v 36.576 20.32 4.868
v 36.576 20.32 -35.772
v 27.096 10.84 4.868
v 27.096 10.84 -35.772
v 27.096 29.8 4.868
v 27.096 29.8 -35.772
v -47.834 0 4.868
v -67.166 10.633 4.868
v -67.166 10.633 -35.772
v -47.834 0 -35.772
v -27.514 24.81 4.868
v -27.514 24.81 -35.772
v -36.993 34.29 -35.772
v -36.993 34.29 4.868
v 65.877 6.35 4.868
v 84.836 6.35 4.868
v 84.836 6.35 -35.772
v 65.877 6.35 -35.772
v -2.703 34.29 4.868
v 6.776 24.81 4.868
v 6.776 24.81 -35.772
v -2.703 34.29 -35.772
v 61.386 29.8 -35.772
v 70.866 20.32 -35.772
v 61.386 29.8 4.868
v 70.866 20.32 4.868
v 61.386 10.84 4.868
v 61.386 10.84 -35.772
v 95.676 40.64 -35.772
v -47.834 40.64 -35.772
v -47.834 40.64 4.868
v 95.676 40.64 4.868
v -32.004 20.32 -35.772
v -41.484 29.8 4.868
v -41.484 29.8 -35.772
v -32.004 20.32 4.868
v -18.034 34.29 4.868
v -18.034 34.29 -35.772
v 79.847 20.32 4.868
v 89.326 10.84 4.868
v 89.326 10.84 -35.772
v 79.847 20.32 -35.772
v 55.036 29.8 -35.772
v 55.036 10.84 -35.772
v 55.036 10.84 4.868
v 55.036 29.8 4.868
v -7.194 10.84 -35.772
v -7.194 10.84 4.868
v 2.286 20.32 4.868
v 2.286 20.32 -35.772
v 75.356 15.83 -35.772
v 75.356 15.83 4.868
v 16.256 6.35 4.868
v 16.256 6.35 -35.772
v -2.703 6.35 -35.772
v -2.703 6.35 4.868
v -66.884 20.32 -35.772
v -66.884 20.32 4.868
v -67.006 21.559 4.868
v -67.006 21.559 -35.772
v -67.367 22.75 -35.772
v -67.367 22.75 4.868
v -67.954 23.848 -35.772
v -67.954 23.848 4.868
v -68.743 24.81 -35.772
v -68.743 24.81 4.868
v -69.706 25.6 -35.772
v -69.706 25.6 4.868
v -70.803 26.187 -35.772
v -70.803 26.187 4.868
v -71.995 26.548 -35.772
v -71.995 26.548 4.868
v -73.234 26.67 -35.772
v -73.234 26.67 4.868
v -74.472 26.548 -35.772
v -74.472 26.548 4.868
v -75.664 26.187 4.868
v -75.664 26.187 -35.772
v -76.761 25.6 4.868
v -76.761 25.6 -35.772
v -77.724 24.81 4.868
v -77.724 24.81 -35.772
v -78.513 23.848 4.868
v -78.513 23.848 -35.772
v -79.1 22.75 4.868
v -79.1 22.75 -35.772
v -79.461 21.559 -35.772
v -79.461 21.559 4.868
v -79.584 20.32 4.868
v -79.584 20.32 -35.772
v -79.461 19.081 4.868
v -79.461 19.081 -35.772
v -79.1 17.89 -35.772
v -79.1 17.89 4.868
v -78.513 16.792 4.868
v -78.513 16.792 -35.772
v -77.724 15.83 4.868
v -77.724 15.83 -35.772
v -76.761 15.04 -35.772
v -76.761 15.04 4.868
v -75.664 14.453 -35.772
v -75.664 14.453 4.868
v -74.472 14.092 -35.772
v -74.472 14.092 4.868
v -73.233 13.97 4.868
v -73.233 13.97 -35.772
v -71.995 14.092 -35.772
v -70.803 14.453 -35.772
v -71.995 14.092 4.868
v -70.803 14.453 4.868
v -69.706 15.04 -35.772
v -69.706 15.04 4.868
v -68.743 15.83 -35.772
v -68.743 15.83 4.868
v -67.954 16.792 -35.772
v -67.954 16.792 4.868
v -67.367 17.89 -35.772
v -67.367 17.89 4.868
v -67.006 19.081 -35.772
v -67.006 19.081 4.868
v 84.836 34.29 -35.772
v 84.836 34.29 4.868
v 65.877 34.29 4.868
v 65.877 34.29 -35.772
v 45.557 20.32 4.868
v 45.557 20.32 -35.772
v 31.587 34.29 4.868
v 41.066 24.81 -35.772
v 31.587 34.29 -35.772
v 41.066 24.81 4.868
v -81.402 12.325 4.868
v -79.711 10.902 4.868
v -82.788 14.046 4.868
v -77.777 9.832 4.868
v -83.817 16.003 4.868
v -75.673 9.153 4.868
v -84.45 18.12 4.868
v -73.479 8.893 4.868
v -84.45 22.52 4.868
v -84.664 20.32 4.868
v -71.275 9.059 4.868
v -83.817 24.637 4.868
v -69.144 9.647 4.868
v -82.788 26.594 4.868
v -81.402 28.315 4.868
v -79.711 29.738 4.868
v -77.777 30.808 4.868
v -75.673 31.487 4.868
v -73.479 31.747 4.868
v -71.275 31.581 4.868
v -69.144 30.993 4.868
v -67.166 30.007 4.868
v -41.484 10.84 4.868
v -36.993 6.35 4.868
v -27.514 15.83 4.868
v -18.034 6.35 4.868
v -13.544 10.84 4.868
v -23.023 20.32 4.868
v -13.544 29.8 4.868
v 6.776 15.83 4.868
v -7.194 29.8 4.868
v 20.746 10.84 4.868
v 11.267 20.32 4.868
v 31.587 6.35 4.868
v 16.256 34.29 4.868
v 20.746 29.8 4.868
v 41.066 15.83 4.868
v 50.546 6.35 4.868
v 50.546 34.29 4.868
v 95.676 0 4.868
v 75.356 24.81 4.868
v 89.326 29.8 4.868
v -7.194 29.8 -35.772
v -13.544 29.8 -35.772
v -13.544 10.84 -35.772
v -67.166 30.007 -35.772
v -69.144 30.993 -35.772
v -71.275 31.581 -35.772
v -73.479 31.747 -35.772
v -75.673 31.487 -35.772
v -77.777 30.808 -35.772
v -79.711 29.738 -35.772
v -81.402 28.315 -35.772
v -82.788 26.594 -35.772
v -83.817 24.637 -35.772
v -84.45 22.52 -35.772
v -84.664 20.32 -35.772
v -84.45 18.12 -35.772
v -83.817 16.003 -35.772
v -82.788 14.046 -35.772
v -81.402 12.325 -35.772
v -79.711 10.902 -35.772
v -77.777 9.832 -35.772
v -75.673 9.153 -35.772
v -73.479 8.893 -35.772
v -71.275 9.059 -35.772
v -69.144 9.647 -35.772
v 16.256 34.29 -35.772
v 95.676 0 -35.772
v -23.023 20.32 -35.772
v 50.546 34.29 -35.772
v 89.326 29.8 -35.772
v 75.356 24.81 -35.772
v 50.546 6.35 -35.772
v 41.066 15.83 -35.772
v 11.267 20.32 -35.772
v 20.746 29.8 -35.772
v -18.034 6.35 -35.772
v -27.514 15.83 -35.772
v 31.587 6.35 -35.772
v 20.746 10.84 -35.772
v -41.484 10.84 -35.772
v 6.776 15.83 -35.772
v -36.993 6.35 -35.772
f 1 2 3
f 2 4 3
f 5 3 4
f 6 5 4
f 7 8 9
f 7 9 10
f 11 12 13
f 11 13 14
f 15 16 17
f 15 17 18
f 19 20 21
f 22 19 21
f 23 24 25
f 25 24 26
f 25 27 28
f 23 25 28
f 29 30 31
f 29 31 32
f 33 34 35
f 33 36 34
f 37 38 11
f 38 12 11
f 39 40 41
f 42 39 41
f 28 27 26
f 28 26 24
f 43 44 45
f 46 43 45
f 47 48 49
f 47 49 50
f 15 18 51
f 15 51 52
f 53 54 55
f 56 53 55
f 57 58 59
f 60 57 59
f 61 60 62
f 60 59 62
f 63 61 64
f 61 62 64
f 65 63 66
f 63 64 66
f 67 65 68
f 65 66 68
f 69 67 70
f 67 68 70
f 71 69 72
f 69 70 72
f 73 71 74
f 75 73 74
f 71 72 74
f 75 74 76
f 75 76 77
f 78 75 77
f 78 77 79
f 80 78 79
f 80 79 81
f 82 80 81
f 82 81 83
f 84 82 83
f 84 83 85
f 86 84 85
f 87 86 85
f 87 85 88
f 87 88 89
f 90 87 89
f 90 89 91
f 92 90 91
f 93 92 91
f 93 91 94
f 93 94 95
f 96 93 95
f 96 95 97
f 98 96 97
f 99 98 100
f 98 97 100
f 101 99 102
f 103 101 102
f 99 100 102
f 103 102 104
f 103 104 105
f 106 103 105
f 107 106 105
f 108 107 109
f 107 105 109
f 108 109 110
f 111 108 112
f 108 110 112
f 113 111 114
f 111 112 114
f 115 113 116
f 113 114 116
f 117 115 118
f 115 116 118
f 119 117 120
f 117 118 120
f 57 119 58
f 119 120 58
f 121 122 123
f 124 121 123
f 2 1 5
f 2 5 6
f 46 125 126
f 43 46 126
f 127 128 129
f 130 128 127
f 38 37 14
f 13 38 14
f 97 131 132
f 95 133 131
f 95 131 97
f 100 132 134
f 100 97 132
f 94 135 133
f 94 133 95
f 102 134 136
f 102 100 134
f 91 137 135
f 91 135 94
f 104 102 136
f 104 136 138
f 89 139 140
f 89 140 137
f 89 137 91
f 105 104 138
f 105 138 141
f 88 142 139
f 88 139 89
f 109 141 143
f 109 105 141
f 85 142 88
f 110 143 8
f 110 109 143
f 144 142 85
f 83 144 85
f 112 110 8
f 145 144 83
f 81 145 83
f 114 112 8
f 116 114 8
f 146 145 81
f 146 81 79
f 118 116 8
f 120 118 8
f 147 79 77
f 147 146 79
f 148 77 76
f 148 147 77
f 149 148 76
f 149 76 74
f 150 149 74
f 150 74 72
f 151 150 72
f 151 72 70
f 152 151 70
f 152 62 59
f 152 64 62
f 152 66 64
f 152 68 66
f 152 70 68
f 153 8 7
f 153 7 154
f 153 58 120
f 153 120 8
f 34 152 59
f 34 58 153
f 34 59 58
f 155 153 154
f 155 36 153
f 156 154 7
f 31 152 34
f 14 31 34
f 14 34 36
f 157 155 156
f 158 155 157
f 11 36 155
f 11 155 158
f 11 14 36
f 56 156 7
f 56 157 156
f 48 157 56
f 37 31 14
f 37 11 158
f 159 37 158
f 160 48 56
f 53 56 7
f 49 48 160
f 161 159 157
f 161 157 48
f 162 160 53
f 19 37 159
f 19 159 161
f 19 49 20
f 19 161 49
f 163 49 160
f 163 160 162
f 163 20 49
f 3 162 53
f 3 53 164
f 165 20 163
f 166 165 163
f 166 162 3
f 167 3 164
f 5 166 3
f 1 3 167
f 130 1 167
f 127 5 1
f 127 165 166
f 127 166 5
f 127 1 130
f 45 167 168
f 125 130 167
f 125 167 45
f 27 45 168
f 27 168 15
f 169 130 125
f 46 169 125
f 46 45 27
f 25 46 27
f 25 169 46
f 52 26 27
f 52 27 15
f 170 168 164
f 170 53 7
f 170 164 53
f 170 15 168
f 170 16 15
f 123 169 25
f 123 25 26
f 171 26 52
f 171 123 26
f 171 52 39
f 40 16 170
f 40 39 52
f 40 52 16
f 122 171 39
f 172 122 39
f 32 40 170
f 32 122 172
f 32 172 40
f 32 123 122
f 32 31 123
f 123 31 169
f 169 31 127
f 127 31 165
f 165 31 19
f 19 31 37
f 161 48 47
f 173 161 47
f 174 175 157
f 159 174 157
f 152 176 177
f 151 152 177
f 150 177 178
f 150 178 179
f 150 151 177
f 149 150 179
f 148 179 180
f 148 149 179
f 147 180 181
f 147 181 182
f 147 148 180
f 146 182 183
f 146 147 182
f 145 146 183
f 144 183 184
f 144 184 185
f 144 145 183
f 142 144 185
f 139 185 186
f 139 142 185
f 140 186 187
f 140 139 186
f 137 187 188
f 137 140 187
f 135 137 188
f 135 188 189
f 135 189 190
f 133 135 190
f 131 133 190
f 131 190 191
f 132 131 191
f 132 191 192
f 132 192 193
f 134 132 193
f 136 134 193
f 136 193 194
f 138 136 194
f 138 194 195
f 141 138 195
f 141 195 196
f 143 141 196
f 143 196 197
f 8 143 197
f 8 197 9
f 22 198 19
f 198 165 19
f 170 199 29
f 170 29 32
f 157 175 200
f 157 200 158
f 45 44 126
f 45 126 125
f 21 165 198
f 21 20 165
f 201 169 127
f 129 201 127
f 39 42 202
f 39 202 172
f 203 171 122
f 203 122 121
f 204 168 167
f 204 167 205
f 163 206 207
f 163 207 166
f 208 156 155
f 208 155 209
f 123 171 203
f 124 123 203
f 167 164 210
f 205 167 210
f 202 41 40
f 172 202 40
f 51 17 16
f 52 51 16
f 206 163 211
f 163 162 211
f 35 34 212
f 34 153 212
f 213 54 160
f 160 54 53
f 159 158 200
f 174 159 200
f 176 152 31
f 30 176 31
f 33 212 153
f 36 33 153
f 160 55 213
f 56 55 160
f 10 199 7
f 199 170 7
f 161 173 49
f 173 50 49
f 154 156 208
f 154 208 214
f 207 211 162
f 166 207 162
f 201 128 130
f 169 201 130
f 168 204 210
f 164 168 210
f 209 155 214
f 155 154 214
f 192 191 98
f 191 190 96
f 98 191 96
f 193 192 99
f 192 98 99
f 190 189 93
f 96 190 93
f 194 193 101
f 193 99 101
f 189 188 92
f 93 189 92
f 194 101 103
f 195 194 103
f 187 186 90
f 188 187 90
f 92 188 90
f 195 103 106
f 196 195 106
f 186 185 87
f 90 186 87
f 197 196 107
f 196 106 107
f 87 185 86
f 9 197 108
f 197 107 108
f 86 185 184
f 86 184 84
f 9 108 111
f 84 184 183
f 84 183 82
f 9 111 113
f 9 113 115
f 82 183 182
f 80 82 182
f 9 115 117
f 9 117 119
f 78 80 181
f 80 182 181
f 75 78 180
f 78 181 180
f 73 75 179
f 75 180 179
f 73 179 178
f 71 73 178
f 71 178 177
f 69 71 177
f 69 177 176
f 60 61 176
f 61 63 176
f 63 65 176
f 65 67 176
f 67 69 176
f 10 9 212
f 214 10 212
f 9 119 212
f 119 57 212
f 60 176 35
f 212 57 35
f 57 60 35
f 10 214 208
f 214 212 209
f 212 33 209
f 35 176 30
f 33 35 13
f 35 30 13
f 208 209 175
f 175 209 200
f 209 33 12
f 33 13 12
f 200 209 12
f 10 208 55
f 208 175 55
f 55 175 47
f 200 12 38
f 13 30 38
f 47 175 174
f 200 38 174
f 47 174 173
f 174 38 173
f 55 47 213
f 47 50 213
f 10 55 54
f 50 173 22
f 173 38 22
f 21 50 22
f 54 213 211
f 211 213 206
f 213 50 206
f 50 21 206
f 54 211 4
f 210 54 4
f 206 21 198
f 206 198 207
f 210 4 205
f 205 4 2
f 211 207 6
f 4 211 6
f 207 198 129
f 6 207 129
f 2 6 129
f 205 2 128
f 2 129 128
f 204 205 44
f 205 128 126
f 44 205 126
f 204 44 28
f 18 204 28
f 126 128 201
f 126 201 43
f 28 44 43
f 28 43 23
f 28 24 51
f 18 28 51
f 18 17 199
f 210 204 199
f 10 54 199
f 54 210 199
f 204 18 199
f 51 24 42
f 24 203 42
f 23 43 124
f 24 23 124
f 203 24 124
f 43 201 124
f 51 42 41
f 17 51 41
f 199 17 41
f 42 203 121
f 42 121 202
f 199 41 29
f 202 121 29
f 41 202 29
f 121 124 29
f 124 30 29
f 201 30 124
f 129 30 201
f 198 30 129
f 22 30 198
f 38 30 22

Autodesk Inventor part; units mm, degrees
ref_plane "YZ Plane" through (0, 0, 0) normal (1, 0, 0) x (0, 1, 0)
sketch "Sketch1" plane through (0, 0, 0) normal (0, 1, 0) x (-1, 0, 0)
  line L0 (7.1935, 4.8681) -> (47.8335, 4.8681)
  line L1 (47.8335, 4.8681) -> (47.8335, -35.7719)
  line L2 (47.8335, -35.7719) -> (7.1935, -35.7719)
  line L3 (7.1935, -35.7719) -> (7.1935, 4.8681)
  point P0 (0, 0)
  point P1 (47.8335, -15.4519)
  dimension "d0" = 40.64
  dimension "d1" = 40.64
extrude "Extrusion1" add sketch "Sketch1" along normal blind 6.35
ref_plane "Work Plane1" through (-47.8335, 6.35, 4.8681) normal (-0.7071, -0.7071, 0) x (0, 0, 1)
sketch "Sketch4" plane through (0, 6.35, 0) normal (0, 1, 0) x (1, 0, 0)
  line L0 (-47.8335, -4.8681) -> (-13.5468, -4.8681) projected
  line L1 (-47.8335, 35.7719) -> (-7.1935, 35.7719) projected
  line L2 (-47.8335, -4.8681) -> (-41.4835, -4.8681)
  line L3 (-41.4835, -4.8681) -> (-41.4835, 35.7719)
  line L4 (-41.4835, 35.7719) -> (-47.8335, 35.7719)
  line L5 (-47.8335, 35.7719) -> (-47.8335, -4.8681)
  point P0 (0, 0)
  point P1 (-29.7585, -4.8681)
  dimension "d15" = 6.35
extrude "Extrusion4" add sketch "Sketch4" along normal blind 34.29
sketch "Sketch5" plane through (0, 6.35, 0) normal (0, 1, 0) x (1, 0, 0)
  line L0 (-7.1935, 35.7719) -> (-13.5435, 35.7719)
  line L1 (-13.5435, 35.7719) -> (-13.5435, -4.8681)
  line L2 (-13.5435, -4.8681) -> (-7.1935, -4.8681)
  line L3 (-7.1935, -4.8681) -> (-7.1935, 35.7719)
  line L4 (-7.1935, -4.8681) -> (-7.1935, 35.7719) projected
  point P0 (0, 0)
  point P1 (-11.6836, 35.7719)
  dimension "d18" = 6.35
  dimension "d19" = 40.64
extrude "Extrusion5" add sketch "Sketch5" along normal blind 34.29
sketch "Sketch6" plane through (-47.8335, 0, 4.8681) normal (0, 0, 1) x (1, 0, 0)
  line L0 (0, 40.64) -> (6.35, 40.64) projected
  line L1 (0, 40.64) -> (40.64, 40.64)
  line L2 (40.64, 40.64) -> (40.64, 34.29)
  line L3 (40.64, 34.29) -> (0, 34.29)
  line L4 (0, 34.29) -> (0, 40.64)
  point P0 (47.8335, 0)
  dimension "d22" = 40.64
  dimension "d23" = 6.35
extrude "Extrusion6" add sketch "Sketch6" against normal blind 40.64
ref_plane "Work Plane3" through (-7.1935, 6.35, -35.7719) normal (0.7071, -0.7071, 0) x (0, 0, -1)
sketch "Sketch8" plane through (-7.1935, 6.35, -35.7719) normal (0.7071, -0.7071, 0) x (0, 0, -1)
  line L0 (-40.64, -1.3151) -> (-40.64, -7.6651)
  line L1 (-40.64, -4.4901) -> (-40.64, 24.2467) projected
  line L2 (-40.64, -7.6651) -> (0, -7.6651)
  line L3 (0, -33.2269) -> (0, -4.4901) projected
  line L4 (0, -7.6651) -> (0, -1.3151)
  line L5 (0, -1.3151) -> (-40.64, -1.3151)
  dimension "d35" = 6.35
extrude "Extrusion7" add sketch "Sketch8" against normal blind 48.4886
sketch "Sketch9" plane through (-47.8335, 6.35, 4.8681) normal (-0.7071, -0.7071, 0) x (0, 0, 1)
  line L0 (0, -4.4901) -> (-40.64, -4.4901) projected
  line L1 (0, -4.4901) -> (0, -7.6651)
  line L2 (0, -7.6651) -> (-40.64, -7.6651)
  line L3 (-40.64, -7.6651) -> (-40.64, -1.3151)
  line L4 (-40.64, -1.3151) -> (0, -1.3151)
  line L5 (0, -1.3151) -> (0, -4.4901)
  point P0 (-4.8681, -38.3135)
  dimension "d36" = 3.175
  dimension "d37" = 40.64
  dimension "d38" = 90
  dimension "d39" = 6.35
  dimension "d40" = 90
  dimension "d41" = 40.64
  dimension "d42" = 90
extrude "Extrusion8" add sketch "Sketch9" against normal blind 48.4886
sketch "Sketch10" plane through (-7.1935, 0, 4.8681) normal (1, 0, 0) x (0, 0, -1)
  line L0 (0, 0) -> (0, 40.64) projected
  line L1 (0, 40.64) -> (40.64, 40.64)
  line L2 (40.64, 40.64) -> (40.64, 0)
  line L3 (40.64, 0) -> (0, 0)
  line L4 (0, 0) -> (0, 40.64)
  point P0 (4.8681, 0)
extrude "Extrusion9" cut sketch "Sketch10" against normal blind 3.175
mirror "Mirror1" about plane through (-10.3685, 20.32, -15.4519) normal (1, 0, 0)
sketch "Sketch11" plane through (27.0965, 0, 4.8681) normal (1, 0, 0) x (0, 0, -1)
  line L0 (0, 40.64) -> (40.64, 40.64)
  line L1 (40.64, 40.64) -> (40.64, 0)
  line L2 (40.64, 0) -> (0, 0)
  line L3 (0, 0) -> (0, 40.64)
  point P0 (4.8681, 0)
  dimension "d47" = 40.64
  dimension "d48" = 40.64
extrude "Extrusion10" cut sketch "Sketch11" against normal blind 3.175
mirror "Mirror2" about plane through (23.9215, 20.32, -15.4519) normal (1, 0, 0)
sketch "Sketch12" plane through (-47.8335, 0, 4.8681) normal (0, 0, 1) x (1, 0, 0)
  circle A0 centre (-25.4, 20.32) radius 6.35
  line L0 (143.51, 40.64) -> (0, 40.64) projected
  line L1 (0, 0) -> (0, 40.64) projected
  line L2 (-19.3329, 30.0069) -> (0, 40.64)
  line L3 (-19.3329, 10.6331) -> (0, 0)
  arc A1 (-19.3329, 30.0069) -> (-19.3329, 10.6331) centre (-25.4, 20.32) ccw
  point P0 (47.8335, 0)
  dimension "d51" = 12.7
  dimension "d52" = 20.32
  dimension "d53" = 25.4
  dimension "d54" = 22.86
extrude "Extrusion11" add sketch "Sketch12" against normal blind 40.64
properties part number "Leg Box"
